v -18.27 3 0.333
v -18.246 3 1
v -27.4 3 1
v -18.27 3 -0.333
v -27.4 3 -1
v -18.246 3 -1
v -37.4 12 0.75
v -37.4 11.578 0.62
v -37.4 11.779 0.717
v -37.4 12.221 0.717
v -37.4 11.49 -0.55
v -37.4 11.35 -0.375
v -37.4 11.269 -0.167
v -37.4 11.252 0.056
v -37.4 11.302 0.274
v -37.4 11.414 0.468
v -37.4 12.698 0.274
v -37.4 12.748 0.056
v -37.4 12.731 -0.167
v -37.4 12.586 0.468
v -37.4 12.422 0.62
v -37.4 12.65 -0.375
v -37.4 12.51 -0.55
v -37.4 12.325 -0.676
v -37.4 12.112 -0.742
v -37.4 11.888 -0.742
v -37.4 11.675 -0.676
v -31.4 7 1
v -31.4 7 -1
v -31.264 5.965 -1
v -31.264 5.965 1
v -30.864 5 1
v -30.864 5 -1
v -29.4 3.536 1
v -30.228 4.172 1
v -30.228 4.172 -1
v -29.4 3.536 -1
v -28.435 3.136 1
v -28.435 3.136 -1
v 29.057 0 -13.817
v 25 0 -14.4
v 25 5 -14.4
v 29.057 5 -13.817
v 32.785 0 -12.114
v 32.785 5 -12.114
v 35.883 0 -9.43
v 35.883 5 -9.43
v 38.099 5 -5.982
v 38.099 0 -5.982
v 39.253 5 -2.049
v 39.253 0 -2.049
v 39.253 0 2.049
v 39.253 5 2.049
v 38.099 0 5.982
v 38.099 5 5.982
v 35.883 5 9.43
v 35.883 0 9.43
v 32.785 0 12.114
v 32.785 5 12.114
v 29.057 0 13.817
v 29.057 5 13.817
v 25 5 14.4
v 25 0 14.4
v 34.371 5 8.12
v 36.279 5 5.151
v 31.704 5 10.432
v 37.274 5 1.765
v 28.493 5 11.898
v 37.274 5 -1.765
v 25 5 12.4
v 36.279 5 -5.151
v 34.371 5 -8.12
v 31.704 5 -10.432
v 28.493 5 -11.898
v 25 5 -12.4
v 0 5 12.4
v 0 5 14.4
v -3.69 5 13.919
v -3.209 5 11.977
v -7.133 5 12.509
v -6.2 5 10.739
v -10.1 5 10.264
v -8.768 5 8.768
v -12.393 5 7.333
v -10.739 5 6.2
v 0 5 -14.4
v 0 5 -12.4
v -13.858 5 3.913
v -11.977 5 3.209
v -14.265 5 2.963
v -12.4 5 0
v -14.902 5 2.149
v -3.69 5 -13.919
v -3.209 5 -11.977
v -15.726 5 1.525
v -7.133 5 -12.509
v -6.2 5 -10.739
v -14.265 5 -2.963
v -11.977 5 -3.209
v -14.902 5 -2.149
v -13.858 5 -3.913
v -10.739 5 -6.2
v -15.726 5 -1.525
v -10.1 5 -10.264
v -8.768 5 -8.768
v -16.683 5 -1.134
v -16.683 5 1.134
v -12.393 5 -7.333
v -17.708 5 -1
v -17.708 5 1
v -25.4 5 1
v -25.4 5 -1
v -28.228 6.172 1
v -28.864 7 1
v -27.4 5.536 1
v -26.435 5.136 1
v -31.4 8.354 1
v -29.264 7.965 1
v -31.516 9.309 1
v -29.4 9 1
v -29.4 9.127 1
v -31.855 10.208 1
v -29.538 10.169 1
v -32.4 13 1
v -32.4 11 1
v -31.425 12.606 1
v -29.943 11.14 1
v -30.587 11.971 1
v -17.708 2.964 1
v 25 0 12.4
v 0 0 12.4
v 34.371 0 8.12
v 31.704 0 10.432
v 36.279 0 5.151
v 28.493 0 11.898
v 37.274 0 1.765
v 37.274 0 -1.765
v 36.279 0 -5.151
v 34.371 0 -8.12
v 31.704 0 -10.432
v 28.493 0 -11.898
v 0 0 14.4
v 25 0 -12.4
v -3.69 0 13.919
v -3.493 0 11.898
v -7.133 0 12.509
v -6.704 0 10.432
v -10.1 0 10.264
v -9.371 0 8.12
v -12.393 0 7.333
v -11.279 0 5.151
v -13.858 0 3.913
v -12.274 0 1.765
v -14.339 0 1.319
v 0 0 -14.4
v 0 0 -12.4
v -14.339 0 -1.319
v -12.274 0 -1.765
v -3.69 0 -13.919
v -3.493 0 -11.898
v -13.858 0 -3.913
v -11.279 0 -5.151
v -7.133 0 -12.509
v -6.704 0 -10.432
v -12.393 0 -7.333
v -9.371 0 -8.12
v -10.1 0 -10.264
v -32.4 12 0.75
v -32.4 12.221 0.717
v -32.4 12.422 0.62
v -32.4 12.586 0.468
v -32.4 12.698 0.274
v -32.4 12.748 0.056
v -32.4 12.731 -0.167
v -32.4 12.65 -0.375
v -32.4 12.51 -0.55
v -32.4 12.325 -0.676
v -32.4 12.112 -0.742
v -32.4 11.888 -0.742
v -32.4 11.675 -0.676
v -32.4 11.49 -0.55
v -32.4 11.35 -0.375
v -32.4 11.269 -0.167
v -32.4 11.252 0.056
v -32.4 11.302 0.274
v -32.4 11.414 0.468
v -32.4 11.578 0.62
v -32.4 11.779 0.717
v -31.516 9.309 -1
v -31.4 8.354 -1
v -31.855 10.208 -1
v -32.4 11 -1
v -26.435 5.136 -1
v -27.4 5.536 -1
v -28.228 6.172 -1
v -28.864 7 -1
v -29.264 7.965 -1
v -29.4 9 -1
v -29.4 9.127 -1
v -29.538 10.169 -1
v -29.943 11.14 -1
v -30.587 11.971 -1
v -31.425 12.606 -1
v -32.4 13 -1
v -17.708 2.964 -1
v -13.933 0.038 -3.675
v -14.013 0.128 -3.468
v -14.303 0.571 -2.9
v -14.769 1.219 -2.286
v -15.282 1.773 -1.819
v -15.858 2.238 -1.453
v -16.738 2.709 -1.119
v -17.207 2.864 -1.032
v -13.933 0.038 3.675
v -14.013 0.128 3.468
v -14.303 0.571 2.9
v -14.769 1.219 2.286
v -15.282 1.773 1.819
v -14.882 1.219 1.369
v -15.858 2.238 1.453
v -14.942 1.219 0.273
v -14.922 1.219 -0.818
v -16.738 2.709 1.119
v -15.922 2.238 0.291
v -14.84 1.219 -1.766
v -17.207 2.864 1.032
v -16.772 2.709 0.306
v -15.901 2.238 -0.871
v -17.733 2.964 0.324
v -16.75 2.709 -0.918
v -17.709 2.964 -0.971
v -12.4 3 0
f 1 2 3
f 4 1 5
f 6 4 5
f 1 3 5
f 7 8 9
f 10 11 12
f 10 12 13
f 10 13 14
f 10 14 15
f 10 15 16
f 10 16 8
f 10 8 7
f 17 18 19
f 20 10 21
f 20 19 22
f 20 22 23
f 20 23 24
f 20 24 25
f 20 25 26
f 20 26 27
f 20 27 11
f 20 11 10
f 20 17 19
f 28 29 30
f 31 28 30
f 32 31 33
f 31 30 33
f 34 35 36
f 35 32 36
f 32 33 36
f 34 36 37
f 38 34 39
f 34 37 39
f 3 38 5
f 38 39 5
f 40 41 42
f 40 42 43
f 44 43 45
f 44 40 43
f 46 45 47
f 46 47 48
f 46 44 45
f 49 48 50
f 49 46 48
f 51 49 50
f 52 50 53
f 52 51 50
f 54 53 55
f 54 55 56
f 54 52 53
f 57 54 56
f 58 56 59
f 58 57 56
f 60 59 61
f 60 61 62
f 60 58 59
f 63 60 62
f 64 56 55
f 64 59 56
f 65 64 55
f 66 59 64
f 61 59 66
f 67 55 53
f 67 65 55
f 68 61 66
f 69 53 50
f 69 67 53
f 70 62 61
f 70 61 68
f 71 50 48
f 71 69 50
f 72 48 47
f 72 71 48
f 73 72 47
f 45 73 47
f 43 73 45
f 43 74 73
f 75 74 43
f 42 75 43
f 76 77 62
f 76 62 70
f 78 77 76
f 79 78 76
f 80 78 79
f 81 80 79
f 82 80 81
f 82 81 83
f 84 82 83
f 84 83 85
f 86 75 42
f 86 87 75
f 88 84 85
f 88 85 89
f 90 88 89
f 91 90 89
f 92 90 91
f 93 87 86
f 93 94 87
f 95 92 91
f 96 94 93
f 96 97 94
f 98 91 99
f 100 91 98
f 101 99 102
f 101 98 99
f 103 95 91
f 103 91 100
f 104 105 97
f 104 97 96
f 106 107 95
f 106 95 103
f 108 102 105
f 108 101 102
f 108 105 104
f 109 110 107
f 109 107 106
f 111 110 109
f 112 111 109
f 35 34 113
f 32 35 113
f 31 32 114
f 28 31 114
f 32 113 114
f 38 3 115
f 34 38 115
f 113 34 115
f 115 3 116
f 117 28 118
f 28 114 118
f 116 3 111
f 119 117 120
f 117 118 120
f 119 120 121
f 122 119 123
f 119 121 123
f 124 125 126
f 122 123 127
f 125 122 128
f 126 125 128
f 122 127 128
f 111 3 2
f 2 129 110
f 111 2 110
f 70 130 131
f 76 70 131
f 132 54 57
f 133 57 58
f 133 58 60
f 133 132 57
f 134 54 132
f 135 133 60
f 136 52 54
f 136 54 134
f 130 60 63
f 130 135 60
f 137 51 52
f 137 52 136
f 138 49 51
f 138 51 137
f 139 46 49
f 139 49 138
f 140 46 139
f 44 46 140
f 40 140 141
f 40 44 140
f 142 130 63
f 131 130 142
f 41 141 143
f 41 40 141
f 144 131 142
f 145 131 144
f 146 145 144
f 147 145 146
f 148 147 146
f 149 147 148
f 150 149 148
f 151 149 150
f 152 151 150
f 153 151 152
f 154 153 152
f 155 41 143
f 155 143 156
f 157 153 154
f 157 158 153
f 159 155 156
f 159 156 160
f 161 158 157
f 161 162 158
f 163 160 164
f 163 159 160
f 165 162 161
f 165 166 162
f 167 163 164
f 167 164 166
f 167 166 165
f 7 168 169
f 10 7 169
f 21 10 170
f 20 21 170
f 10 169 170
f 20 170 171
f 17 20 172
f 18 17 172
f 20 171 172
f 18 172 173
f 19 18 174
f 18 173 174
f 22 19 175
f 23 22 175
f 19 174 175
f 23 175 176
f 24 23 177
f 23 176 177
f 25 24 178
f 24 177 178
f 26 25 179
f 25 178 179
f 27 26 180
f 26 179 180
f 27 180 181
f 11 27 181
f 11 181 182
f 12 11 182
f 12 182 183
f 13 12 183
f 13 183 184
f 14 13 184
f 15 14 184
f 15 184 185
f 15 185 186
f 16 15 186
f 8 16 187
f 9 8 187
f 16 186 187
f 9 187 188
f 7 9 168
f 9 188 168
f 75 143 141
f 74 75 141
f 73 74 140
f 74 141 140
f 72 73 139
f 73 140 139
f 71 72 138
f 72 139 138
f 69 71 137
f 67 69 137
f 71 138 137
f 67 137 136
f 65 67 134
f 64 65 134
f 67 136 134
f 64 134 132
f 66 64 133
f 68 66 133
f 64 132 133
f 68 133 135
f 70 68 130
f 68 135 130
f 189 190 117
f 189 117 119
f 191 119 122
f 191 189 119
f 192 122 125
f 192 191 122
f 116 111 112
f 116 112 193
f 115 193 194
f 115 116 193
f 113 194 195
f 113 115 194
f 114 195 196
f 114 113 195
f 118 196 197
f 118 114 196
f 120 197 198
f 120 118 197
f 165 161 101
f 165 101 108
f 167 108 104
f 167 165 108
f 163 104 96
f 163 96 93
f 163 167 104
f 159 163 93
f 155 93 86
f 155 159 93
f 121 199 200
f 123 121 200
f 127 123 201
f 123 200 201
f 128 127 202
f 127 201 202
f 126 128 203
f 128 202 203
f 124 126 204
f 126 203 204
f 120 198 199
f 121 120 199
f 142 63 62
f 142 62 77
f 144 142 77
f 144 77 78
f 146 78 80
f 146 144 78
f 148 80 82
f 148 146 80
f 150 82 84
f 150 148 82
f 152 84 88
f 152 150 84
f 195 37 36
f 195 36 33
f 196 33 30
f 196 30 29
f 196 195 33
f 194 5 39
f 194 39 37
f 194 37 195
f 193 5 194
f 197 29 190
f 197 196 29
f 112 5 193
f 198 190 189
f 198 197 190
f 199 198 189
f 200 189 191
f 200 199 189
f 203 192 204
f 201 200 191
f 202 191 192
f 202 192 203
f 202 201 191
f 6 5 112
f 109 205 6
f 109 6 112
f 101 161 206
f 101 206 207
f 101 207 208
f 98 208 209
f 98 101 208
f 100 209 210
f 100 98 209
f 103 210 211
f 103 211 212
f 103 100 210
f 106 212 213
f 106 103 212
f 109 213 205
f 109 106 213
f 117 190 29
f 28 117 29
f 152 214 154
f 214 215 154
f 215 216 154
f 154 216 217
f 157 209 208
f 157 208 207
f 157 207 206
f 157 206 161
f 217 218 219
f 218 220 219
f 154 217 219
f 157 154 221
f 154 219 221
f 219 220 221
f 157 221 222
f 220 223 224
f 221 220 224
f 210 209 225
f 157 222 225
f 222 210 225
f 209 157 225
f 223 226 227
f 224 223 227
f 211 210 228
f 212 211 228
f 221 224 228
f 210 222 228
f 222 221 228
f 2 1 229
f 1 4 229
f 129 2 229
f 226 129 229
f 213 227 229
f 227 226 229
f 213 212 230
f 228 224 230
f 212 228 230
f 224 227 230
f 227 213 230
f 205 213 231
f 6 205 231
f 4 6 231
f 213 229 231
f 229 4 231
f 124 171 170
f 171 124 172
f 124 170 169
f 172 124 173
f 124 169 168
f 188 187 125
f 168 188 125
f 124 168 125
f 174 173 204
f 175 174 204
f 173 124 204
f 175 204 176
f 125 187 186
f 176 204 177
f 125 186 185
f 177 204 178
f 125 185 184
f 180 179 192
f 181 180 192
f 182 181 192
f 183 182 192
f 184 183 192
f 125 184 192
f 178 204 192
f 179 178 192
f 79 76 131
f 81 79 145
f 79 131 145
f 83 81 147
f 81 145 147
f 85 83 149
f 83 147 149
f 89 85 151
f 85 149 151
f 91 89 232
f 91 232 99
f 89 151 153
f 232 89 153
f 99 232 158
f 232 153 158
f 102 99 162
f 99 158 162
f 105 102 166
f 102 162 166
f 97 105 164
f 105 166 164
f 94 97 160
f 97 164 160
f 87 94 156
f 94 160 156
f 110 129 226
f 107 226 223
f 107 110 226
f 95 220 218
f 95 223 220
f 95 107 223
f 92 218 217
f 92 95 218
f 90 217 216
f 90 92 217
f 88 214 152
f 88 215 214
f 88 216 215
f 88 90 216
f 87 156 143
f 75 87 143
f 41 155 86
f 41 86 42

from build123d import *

# Parameters (mm, degrees)
BOSS_EXTRUDE1_DEPTH      = 5
BOSS_EXTRUDE2_DEPTH      = 1
BOSS_EXTRUDE2_DEPTH_BACK = 1
SKETCH4_W                = 2
SKETCH4_H                = 1
SKETCH4_W_2              = 17
SKETCH4_H_2              = 2
SKETCH5_R                = 0.75
BOSS_EXTRUDE3_DEPTH      = 5
FILLET1_R                = 4


with BuildPart() as part:
    # Sketch1 → Boss-Extrude1 (new body)
    with BuildSketch(Plane(origin=(0, 0, 0), x_dir=(1, 0, 0), z_dir=(0, 1, 0))):
        with BuildLine():
            Line((0, 14.4), (25, 14.4))
            ThreePointArc((25, 14.4), (39.4, 0), (25, -14.4))
            Line((25, -14.4), (0, -14.4))
            ThreePointArc((0, -14.4), (-14.4, 0), (0, 14.4))
        make_face()
        with BuildLine():
            Line((0, 12.4), (25, 12.4))
            ThreePointArc((25, 12.4), (37.4, 0), (25, -12.4))
            Line((25, -12.4), (0, -12.4))
            ThreePointArc((0, -12.4), (-12.4, 0), (0, 12.4))
        make_face(mode=Mode.SUBTRACT)
    extrude(amount=BOSS_EXTRUDE1_DEPTH)

    # Sketch4 → Boss-Extrude2 (add, two sides: drawn at the far end of the back side and taken through both)
    with BuildSketch(Plane.XY.offset(-BOSS_EXTRUDE2_DEPTH_BACK)):
        Polygon((-31.4, 12), (-29.4, 12), (-29.4, 13), (-32.4, 13), (-32.4, 11), (-31.4, 11), align=None)
        with Locations((-30.4, 11.5)):
            Rectangle(SKETCH4_W, SKETCH4_H)
        Polygon((-29.4, 3), (-29.4, 5), (-29.4, 11), (-31.4, 11), (-31.4, 3), align=None)
        with Locations((-20.9, 4)):
            Rectangle(SKETCH4_W_2, SKETCH4_H_2)
    extrude(amount=BOSS_EXTRUDE2_DEPTH + BOSS_EXTRUDE2_DEPTH_BACK)

    # Sketch5 → Boss-Extrude3 (add)
    with BuildSketch(Plane.ZY.offset(32.4)):
        with Locations((0, 12)):
            Circle(SKETCH5_R)
    extrude(amount=BOSS_EXTRUDE3_DEPTH)

    # Fillet1
    # the kernel refuses this fillet: 4 mm, written as the material it adds along each edge
    with BuildSketch(Plane(origin=(-14.365235814, 5, -1), x_dir=(0.17149804582148126, 0, -0.9851844600273663), z_dir=(0, -1, 0))) as fillet1_piece_1:
        with BuildLine():
            CenterArc((3.367524545, -3.978862537), FILLET1_R, 95.892851455, 74.232218513)
            Line((-0.573213295, -3.292870354), (-0.652028052, -3.27915051))
            Line((-0.652028052, -3.27915051), (-0.078814757, 0.013719844))
            Line((-0.078814757, 0.013719844), (0.008213474, 0.079577251))
            ThreePointArc((0.008213474, 0.079577251), (1.47842541, 0.003905135), (2.948637345, 0.079577251))
            Line((2.948637345, 0.079577251), (2.95685082, 0))
        make_face()
    extrude(amount=2)
    with BuildSketch(Plane(origin=(-14.365235814, 5, 1), x_dir=(0.17149804582148112, 0, 0.9851844600273663), z_dir=(0, -1, 0))) as fillet1_piece_2:
        with BuildLine():
            CenterArc((3.367524545, 3.978862537), FILLET1_R, 189.874930032, 74.232218513)
            Line((-0.573213295, 3.292870354), (-0.652028052, 3.27915051))
            Line((-0.652028052, 3.27915051), (-0.078814757, -0.013719844))
            Line((-0.078814757, -0.013719844), (0.008213474, -0.079577251))
            ThreePointArc((0.008213474, -0.079577251), (1.47842541, -0.003905135), (2.948637345, -0.079577251))
            Line((2.948637345, -0.079577251), (2.95685082, 0))
        make_face()
    extrude(amount=2)
    with BuildSketch(Plane(origin=(0, 3, 0), x_dir=(-0.7371891614816782, 0, 0.6756864214959037), z_dir=(0.6756864214959037, 0, 0.7371891614816782))) as fillet1_piece_3_section:
        with BuildLine():
            CenterArc((18.272983346, 4), FILLET1_R, 194.477512186, 75.522487814)
            Line((18.272983346, 0), (18.272983346, -0.08))
            Line((18.272983346, -0.08), (14.4, -0.08))
            Line((14.4, -0.08), (14.32, 0))
            ThreePointArc((14.32, 0), (14.32, 1.5), (14.322540333, 2.98))
            Line((14.322540333, 2.98), (14.4, 3))
        make_face()
    fillet1_piece_3 = revolve(axis=Axis((0, 3, 0), (0, -1, 0)), revolution_arc=85.014954966, mode=Mode.PRIVATE)
    fillet1_piece_3 = split(fillet1_piece_3, bisect_by=Plane(origin=(-15.301586286, 2.241601932, -1), z_dir=(0, 0, 1)), keep=Keep.TOP, mode=Mode.PRIVATE)
    fillet1_piece_3 = split(fillet1_piece_3, bisect_by=Plane(origin=(-15.301586286, 2.241601932, 1), z_dir=(0, 0, -1)), keep=Keep.TOP, mode=Mode.PRIVATE)
    add(fillet1_piece_3)
    with BuildSketch(Plane(origin=(-29.4, 5, 1), x_dir=(1, 0, 0), z_dir=(0, 0, -1))) as fillet1_piece_4:
        with BuildLine():
            CenterArc((FILLET1_R, -FILLET1_R), FILLET1_R, 90, 90)
            Line((0, -FILLET1_R), (-FILLET1_R * 0.02, -FILLET1_R))
            Line((-FILLET1_R * 0.02, -FILLET1_R), (-FILLET1_R * 0.02, FILLET1_R * 0.02))
            Line((-FILLET1_R * 0.02, FILLET1_R * 0.02), (FILLET1_R, FILLET1_R * 0.02))
            Line((FILLET1_R, FILLET1_R * 0.02), (FILLET1_R, 0))
        make_face()
    extrude(amount=2)
    with BuildSketch(Plane(origin=(-31.4, 11, -1), x_dir=(0, -1, 0), z_dir=(0, 0, 1))) as fillet1_piece_5:
        with BuildLine():
            CenterArc((2.645751311, -4), FILLET1_R, 90, 41.409622109)
            Line((0, -1), (-0.052915026, -0.94))
            ThreePointArc((-0.052915026, -0.94), (-0.08, -0.5), (-0.08, 0))
            Line((-0.08, 0), (0, 0.08))
            Line((0, 0.08), (2.645751311, 0.08))
            Line((2.645751311, 0.08), (2.645751311, 0))
        make_face()
    extrude(amount=2)
    with BuildSketch(Plane(origin=(-14.365235814, 5, -1), x_dir=(0.17149804582148126, 0, -0.9851844600273663), z_dir=(0, -1, 0))) as fillet1_piece_6a_section:
        with BuildLine():
            CenterArc((3.367524545, -3.978862537), FILLET1_R, 95.892851455, 74.232218513)
            Line((-0.573213295, -3.292870354), (-0.652028052, -3.27915051))
            Line((-0.652028052, -3.27915051), (-0.078814757, 0.013719844))
            Line((-0.078814757, 0.013719844), (0.008213474, 0.079577251))
            ThreePointArc((0.008213474, 0.079577251), (1.47842541, 0.003905135), (2.948637345, 0.079577251))
            Line((2.948637345, 0.079577251), (2.95685082, 0))
        make_face()
    fillet1_piece_6a = extrude(amount=10.355974154, mode=Mode.PRIVATE)
    fillet1_piece_6a = split(fillet1_piece_6a, bisect_by=Plane(origin=(-15.057221624, 0, -1.646357347), z_dir=(0, 1, 0)), keep=Keep.TOP, mode=Mode.PRIVATE)
    fillet1_piece_6a = split(fillet1_piece_6a, bisect_by=Plane(origin=(-15.057221624, 3, -1.646357347), z_dir=(0, -1, 0)), keep=Keep.TOP, mode=Mode.PRIVATE)
    with BuildSketch(Plane(origin=(0, 3, 0), x_dir=(-0.7371891614816782, 0, 0.6756864214959037), z_dir=(0.6756864214959037, 0, 0.7371891614816782))) as fillet1_piece_6b_section:
        with BuildLine():
            CenterArc((18.272983346, 4), FILLET1_R, 194.477512186, 75.522487814)
            Line((18.272983346, 0), (18.272983346, -0.08))
            Line((18.272983346, -0.08), (14.4, -0.08))
            Line((14.4, -0.08), (14.32, 0))
            ThreePointArc((14.32, 0), (14.32, 1.5), (14.322540333, 2.98))
            Line((14.322540333, 2.98), (14.4, 3))
        make_face()
    fillet1_piece_6b = revolve(axis=Axis((0, 3, 0), (0, -1, 0)), revolution_arc=85.014954966, mode=Mode.PRIVATE)
    fillet1_piece_6b = split(fillet1_piece_6b, bisect_by=Plane(origin=(-13.861423807, 2.266551545, -1), z_dir=(0, 0, -1)), keep=Keep.TOP, mode=Mode.PRIVATE)
    fillet1_piece_6 = fillet1_piece_6a & fillet1_piece_6b
    add(fillet1_piece_6)
    with BuildSketch(Plane(origin=(0, 3, 0), x_dir=(-0.7371891614816782, 0, 0.6756864214959037), z_dir=(0.6756864214959037, 0, 0.7371891614816782))) as fillet1_piece_7a_section:
        with BuildLine():
            CenterArc((18.272983346, 4), FILLET1_R, 194.477512186, 75.522487814)
            Line((18.272983346, 0), (18.272983346, -0.08))
            Line((18.272983346, -0.08), (14.4, -0.08))
            Line((14.4, -0.08), (14.32, 0))
            ThreePointArc((14.32, 0), (14.32, 1.5), (14.322540333, 2.98))
            Line((14.322540333, 2.98), (14.4, 3))
        make_face()
    fillet1_piece_7a = revolve(axis=Axis((0, 3, 0), (0, -1, 0)), revolution_arc=85.014954966, mode=Mode.PRIVATE)
    fillet1_piece_7a = split(fillet1_piece_7a, bisect_by=Plane(origin=(-13.861424305, 2.266551683, 1), z_dir=(0, 0, 1)), keep=Keep.TOP, mode=Mode.PRIVATE)
    with BuildSketch(Plane(origin=(-14.365235814, 5, 1), x_dir=(0.17149804582148112, 0, 0.9851844600273663), z_dir=(0, -1, 0))) as fillet1_piece_7b_section:
        with BuildLine():
            CenterArc((3.367524545, 3.978862537), FILLET1_R, 189.874930032, 74.232218513)
            Line((-0.573213295, 3.292870354), (-0.652028052, 3.27915051))
            Line((-0.652028052, 3.27915051), (-0.078814757, -0.013719844))
            Line((-0.078814757, -0.013719844), (0.008213474, -0.079577251))
            ThreePointArc((0.008213474, -0.079577251), (1.47842541, -0.003905135), (2.948637345, -0.079577251))
            Line((2.948637345, -0.079577251), (2.95685082, 0))
        make_face()
    fillet1_piece_7b = extrude(amount=10.355974154, mode=Mode.PRIVATE)
    fillet1_piece_7b = split(fillet1_piece_7b, bisect_by=Plane(origin=(-15.057221624, 0, 1.646357347), z_dir=(0, 1, 0)), keep=Keep.TOP, mode=Mode.PRIVATE)
    fillet1_piece_7b = split(fillet1_piece_7b, bisect_by=Plane(origin=(-15.057221624, 3, 1.646357347), z_dir=(0, -1, 0)), keep=Keep.TOP, mode=Mode.PRIVATE)
    fillet1_piece_7 = fillet1_piece_7a & fillet1_piece_7b
    add(fillet1_piece_7)
    # the kernel refuses this fillet: 4 mm, written as the material it takes off along each edge
    with BuildSketch(Plane(origin=(-31.4, 3, -11), x_dir=(1, 0, 0), z_dir=(0, 0, 1))) as fillet1_2_piece_1:
        with BuildLine():
            CenterArc((FILLET1_R, FILLET1_R), FILLET1_R, 180, 90)
            Line((0, FILLET1_R), (-FILLET1_R * 0.02, FILLET1_R))
            Line((-FILLET1_R * 0.02, FILLET1_R), (-FILLET1_R * 0.02, -FILLET1_R * 0.02))
            Line((-FILLET1_R * 0.02, -FILLET1_R * 0.02), (FILLET1_R, -FILLET1_R * 0.02))
            Line((FILLET1_R, -FILLET1_R * 0.02), (FILLET1_R, 0))
        make_face()
    extrude(amount=22, mode=Mode.SUBTRACT)
    with BuildSketch(Plane(origin=(-29.4, 13, -10.682458366), x_dir=(-1, 0, 0), z_dir=(0, 0, 1))) as fillet1_2_piece_2:
        with BuildLine():
            CenterArc((4, 3.872983346), FILLET1_R, 180, 75.522487814)
            Line((0, 3.872983346), (-0.08, 3.872983346))
            Line((-0.08, 3.872983346), (-0.08, 0))
            Line((-0.08, 0), (0, -0.08))
            ThreePointArc((0, -0.08), (1.5, -0.08), (2.98, -0.077459667))
            Line((2.98, -0.077459667), (3, 0))
        make_face()
    extrude(amount=21.364916731, mode=Mode.SUBTRACT)


solid = part.part
